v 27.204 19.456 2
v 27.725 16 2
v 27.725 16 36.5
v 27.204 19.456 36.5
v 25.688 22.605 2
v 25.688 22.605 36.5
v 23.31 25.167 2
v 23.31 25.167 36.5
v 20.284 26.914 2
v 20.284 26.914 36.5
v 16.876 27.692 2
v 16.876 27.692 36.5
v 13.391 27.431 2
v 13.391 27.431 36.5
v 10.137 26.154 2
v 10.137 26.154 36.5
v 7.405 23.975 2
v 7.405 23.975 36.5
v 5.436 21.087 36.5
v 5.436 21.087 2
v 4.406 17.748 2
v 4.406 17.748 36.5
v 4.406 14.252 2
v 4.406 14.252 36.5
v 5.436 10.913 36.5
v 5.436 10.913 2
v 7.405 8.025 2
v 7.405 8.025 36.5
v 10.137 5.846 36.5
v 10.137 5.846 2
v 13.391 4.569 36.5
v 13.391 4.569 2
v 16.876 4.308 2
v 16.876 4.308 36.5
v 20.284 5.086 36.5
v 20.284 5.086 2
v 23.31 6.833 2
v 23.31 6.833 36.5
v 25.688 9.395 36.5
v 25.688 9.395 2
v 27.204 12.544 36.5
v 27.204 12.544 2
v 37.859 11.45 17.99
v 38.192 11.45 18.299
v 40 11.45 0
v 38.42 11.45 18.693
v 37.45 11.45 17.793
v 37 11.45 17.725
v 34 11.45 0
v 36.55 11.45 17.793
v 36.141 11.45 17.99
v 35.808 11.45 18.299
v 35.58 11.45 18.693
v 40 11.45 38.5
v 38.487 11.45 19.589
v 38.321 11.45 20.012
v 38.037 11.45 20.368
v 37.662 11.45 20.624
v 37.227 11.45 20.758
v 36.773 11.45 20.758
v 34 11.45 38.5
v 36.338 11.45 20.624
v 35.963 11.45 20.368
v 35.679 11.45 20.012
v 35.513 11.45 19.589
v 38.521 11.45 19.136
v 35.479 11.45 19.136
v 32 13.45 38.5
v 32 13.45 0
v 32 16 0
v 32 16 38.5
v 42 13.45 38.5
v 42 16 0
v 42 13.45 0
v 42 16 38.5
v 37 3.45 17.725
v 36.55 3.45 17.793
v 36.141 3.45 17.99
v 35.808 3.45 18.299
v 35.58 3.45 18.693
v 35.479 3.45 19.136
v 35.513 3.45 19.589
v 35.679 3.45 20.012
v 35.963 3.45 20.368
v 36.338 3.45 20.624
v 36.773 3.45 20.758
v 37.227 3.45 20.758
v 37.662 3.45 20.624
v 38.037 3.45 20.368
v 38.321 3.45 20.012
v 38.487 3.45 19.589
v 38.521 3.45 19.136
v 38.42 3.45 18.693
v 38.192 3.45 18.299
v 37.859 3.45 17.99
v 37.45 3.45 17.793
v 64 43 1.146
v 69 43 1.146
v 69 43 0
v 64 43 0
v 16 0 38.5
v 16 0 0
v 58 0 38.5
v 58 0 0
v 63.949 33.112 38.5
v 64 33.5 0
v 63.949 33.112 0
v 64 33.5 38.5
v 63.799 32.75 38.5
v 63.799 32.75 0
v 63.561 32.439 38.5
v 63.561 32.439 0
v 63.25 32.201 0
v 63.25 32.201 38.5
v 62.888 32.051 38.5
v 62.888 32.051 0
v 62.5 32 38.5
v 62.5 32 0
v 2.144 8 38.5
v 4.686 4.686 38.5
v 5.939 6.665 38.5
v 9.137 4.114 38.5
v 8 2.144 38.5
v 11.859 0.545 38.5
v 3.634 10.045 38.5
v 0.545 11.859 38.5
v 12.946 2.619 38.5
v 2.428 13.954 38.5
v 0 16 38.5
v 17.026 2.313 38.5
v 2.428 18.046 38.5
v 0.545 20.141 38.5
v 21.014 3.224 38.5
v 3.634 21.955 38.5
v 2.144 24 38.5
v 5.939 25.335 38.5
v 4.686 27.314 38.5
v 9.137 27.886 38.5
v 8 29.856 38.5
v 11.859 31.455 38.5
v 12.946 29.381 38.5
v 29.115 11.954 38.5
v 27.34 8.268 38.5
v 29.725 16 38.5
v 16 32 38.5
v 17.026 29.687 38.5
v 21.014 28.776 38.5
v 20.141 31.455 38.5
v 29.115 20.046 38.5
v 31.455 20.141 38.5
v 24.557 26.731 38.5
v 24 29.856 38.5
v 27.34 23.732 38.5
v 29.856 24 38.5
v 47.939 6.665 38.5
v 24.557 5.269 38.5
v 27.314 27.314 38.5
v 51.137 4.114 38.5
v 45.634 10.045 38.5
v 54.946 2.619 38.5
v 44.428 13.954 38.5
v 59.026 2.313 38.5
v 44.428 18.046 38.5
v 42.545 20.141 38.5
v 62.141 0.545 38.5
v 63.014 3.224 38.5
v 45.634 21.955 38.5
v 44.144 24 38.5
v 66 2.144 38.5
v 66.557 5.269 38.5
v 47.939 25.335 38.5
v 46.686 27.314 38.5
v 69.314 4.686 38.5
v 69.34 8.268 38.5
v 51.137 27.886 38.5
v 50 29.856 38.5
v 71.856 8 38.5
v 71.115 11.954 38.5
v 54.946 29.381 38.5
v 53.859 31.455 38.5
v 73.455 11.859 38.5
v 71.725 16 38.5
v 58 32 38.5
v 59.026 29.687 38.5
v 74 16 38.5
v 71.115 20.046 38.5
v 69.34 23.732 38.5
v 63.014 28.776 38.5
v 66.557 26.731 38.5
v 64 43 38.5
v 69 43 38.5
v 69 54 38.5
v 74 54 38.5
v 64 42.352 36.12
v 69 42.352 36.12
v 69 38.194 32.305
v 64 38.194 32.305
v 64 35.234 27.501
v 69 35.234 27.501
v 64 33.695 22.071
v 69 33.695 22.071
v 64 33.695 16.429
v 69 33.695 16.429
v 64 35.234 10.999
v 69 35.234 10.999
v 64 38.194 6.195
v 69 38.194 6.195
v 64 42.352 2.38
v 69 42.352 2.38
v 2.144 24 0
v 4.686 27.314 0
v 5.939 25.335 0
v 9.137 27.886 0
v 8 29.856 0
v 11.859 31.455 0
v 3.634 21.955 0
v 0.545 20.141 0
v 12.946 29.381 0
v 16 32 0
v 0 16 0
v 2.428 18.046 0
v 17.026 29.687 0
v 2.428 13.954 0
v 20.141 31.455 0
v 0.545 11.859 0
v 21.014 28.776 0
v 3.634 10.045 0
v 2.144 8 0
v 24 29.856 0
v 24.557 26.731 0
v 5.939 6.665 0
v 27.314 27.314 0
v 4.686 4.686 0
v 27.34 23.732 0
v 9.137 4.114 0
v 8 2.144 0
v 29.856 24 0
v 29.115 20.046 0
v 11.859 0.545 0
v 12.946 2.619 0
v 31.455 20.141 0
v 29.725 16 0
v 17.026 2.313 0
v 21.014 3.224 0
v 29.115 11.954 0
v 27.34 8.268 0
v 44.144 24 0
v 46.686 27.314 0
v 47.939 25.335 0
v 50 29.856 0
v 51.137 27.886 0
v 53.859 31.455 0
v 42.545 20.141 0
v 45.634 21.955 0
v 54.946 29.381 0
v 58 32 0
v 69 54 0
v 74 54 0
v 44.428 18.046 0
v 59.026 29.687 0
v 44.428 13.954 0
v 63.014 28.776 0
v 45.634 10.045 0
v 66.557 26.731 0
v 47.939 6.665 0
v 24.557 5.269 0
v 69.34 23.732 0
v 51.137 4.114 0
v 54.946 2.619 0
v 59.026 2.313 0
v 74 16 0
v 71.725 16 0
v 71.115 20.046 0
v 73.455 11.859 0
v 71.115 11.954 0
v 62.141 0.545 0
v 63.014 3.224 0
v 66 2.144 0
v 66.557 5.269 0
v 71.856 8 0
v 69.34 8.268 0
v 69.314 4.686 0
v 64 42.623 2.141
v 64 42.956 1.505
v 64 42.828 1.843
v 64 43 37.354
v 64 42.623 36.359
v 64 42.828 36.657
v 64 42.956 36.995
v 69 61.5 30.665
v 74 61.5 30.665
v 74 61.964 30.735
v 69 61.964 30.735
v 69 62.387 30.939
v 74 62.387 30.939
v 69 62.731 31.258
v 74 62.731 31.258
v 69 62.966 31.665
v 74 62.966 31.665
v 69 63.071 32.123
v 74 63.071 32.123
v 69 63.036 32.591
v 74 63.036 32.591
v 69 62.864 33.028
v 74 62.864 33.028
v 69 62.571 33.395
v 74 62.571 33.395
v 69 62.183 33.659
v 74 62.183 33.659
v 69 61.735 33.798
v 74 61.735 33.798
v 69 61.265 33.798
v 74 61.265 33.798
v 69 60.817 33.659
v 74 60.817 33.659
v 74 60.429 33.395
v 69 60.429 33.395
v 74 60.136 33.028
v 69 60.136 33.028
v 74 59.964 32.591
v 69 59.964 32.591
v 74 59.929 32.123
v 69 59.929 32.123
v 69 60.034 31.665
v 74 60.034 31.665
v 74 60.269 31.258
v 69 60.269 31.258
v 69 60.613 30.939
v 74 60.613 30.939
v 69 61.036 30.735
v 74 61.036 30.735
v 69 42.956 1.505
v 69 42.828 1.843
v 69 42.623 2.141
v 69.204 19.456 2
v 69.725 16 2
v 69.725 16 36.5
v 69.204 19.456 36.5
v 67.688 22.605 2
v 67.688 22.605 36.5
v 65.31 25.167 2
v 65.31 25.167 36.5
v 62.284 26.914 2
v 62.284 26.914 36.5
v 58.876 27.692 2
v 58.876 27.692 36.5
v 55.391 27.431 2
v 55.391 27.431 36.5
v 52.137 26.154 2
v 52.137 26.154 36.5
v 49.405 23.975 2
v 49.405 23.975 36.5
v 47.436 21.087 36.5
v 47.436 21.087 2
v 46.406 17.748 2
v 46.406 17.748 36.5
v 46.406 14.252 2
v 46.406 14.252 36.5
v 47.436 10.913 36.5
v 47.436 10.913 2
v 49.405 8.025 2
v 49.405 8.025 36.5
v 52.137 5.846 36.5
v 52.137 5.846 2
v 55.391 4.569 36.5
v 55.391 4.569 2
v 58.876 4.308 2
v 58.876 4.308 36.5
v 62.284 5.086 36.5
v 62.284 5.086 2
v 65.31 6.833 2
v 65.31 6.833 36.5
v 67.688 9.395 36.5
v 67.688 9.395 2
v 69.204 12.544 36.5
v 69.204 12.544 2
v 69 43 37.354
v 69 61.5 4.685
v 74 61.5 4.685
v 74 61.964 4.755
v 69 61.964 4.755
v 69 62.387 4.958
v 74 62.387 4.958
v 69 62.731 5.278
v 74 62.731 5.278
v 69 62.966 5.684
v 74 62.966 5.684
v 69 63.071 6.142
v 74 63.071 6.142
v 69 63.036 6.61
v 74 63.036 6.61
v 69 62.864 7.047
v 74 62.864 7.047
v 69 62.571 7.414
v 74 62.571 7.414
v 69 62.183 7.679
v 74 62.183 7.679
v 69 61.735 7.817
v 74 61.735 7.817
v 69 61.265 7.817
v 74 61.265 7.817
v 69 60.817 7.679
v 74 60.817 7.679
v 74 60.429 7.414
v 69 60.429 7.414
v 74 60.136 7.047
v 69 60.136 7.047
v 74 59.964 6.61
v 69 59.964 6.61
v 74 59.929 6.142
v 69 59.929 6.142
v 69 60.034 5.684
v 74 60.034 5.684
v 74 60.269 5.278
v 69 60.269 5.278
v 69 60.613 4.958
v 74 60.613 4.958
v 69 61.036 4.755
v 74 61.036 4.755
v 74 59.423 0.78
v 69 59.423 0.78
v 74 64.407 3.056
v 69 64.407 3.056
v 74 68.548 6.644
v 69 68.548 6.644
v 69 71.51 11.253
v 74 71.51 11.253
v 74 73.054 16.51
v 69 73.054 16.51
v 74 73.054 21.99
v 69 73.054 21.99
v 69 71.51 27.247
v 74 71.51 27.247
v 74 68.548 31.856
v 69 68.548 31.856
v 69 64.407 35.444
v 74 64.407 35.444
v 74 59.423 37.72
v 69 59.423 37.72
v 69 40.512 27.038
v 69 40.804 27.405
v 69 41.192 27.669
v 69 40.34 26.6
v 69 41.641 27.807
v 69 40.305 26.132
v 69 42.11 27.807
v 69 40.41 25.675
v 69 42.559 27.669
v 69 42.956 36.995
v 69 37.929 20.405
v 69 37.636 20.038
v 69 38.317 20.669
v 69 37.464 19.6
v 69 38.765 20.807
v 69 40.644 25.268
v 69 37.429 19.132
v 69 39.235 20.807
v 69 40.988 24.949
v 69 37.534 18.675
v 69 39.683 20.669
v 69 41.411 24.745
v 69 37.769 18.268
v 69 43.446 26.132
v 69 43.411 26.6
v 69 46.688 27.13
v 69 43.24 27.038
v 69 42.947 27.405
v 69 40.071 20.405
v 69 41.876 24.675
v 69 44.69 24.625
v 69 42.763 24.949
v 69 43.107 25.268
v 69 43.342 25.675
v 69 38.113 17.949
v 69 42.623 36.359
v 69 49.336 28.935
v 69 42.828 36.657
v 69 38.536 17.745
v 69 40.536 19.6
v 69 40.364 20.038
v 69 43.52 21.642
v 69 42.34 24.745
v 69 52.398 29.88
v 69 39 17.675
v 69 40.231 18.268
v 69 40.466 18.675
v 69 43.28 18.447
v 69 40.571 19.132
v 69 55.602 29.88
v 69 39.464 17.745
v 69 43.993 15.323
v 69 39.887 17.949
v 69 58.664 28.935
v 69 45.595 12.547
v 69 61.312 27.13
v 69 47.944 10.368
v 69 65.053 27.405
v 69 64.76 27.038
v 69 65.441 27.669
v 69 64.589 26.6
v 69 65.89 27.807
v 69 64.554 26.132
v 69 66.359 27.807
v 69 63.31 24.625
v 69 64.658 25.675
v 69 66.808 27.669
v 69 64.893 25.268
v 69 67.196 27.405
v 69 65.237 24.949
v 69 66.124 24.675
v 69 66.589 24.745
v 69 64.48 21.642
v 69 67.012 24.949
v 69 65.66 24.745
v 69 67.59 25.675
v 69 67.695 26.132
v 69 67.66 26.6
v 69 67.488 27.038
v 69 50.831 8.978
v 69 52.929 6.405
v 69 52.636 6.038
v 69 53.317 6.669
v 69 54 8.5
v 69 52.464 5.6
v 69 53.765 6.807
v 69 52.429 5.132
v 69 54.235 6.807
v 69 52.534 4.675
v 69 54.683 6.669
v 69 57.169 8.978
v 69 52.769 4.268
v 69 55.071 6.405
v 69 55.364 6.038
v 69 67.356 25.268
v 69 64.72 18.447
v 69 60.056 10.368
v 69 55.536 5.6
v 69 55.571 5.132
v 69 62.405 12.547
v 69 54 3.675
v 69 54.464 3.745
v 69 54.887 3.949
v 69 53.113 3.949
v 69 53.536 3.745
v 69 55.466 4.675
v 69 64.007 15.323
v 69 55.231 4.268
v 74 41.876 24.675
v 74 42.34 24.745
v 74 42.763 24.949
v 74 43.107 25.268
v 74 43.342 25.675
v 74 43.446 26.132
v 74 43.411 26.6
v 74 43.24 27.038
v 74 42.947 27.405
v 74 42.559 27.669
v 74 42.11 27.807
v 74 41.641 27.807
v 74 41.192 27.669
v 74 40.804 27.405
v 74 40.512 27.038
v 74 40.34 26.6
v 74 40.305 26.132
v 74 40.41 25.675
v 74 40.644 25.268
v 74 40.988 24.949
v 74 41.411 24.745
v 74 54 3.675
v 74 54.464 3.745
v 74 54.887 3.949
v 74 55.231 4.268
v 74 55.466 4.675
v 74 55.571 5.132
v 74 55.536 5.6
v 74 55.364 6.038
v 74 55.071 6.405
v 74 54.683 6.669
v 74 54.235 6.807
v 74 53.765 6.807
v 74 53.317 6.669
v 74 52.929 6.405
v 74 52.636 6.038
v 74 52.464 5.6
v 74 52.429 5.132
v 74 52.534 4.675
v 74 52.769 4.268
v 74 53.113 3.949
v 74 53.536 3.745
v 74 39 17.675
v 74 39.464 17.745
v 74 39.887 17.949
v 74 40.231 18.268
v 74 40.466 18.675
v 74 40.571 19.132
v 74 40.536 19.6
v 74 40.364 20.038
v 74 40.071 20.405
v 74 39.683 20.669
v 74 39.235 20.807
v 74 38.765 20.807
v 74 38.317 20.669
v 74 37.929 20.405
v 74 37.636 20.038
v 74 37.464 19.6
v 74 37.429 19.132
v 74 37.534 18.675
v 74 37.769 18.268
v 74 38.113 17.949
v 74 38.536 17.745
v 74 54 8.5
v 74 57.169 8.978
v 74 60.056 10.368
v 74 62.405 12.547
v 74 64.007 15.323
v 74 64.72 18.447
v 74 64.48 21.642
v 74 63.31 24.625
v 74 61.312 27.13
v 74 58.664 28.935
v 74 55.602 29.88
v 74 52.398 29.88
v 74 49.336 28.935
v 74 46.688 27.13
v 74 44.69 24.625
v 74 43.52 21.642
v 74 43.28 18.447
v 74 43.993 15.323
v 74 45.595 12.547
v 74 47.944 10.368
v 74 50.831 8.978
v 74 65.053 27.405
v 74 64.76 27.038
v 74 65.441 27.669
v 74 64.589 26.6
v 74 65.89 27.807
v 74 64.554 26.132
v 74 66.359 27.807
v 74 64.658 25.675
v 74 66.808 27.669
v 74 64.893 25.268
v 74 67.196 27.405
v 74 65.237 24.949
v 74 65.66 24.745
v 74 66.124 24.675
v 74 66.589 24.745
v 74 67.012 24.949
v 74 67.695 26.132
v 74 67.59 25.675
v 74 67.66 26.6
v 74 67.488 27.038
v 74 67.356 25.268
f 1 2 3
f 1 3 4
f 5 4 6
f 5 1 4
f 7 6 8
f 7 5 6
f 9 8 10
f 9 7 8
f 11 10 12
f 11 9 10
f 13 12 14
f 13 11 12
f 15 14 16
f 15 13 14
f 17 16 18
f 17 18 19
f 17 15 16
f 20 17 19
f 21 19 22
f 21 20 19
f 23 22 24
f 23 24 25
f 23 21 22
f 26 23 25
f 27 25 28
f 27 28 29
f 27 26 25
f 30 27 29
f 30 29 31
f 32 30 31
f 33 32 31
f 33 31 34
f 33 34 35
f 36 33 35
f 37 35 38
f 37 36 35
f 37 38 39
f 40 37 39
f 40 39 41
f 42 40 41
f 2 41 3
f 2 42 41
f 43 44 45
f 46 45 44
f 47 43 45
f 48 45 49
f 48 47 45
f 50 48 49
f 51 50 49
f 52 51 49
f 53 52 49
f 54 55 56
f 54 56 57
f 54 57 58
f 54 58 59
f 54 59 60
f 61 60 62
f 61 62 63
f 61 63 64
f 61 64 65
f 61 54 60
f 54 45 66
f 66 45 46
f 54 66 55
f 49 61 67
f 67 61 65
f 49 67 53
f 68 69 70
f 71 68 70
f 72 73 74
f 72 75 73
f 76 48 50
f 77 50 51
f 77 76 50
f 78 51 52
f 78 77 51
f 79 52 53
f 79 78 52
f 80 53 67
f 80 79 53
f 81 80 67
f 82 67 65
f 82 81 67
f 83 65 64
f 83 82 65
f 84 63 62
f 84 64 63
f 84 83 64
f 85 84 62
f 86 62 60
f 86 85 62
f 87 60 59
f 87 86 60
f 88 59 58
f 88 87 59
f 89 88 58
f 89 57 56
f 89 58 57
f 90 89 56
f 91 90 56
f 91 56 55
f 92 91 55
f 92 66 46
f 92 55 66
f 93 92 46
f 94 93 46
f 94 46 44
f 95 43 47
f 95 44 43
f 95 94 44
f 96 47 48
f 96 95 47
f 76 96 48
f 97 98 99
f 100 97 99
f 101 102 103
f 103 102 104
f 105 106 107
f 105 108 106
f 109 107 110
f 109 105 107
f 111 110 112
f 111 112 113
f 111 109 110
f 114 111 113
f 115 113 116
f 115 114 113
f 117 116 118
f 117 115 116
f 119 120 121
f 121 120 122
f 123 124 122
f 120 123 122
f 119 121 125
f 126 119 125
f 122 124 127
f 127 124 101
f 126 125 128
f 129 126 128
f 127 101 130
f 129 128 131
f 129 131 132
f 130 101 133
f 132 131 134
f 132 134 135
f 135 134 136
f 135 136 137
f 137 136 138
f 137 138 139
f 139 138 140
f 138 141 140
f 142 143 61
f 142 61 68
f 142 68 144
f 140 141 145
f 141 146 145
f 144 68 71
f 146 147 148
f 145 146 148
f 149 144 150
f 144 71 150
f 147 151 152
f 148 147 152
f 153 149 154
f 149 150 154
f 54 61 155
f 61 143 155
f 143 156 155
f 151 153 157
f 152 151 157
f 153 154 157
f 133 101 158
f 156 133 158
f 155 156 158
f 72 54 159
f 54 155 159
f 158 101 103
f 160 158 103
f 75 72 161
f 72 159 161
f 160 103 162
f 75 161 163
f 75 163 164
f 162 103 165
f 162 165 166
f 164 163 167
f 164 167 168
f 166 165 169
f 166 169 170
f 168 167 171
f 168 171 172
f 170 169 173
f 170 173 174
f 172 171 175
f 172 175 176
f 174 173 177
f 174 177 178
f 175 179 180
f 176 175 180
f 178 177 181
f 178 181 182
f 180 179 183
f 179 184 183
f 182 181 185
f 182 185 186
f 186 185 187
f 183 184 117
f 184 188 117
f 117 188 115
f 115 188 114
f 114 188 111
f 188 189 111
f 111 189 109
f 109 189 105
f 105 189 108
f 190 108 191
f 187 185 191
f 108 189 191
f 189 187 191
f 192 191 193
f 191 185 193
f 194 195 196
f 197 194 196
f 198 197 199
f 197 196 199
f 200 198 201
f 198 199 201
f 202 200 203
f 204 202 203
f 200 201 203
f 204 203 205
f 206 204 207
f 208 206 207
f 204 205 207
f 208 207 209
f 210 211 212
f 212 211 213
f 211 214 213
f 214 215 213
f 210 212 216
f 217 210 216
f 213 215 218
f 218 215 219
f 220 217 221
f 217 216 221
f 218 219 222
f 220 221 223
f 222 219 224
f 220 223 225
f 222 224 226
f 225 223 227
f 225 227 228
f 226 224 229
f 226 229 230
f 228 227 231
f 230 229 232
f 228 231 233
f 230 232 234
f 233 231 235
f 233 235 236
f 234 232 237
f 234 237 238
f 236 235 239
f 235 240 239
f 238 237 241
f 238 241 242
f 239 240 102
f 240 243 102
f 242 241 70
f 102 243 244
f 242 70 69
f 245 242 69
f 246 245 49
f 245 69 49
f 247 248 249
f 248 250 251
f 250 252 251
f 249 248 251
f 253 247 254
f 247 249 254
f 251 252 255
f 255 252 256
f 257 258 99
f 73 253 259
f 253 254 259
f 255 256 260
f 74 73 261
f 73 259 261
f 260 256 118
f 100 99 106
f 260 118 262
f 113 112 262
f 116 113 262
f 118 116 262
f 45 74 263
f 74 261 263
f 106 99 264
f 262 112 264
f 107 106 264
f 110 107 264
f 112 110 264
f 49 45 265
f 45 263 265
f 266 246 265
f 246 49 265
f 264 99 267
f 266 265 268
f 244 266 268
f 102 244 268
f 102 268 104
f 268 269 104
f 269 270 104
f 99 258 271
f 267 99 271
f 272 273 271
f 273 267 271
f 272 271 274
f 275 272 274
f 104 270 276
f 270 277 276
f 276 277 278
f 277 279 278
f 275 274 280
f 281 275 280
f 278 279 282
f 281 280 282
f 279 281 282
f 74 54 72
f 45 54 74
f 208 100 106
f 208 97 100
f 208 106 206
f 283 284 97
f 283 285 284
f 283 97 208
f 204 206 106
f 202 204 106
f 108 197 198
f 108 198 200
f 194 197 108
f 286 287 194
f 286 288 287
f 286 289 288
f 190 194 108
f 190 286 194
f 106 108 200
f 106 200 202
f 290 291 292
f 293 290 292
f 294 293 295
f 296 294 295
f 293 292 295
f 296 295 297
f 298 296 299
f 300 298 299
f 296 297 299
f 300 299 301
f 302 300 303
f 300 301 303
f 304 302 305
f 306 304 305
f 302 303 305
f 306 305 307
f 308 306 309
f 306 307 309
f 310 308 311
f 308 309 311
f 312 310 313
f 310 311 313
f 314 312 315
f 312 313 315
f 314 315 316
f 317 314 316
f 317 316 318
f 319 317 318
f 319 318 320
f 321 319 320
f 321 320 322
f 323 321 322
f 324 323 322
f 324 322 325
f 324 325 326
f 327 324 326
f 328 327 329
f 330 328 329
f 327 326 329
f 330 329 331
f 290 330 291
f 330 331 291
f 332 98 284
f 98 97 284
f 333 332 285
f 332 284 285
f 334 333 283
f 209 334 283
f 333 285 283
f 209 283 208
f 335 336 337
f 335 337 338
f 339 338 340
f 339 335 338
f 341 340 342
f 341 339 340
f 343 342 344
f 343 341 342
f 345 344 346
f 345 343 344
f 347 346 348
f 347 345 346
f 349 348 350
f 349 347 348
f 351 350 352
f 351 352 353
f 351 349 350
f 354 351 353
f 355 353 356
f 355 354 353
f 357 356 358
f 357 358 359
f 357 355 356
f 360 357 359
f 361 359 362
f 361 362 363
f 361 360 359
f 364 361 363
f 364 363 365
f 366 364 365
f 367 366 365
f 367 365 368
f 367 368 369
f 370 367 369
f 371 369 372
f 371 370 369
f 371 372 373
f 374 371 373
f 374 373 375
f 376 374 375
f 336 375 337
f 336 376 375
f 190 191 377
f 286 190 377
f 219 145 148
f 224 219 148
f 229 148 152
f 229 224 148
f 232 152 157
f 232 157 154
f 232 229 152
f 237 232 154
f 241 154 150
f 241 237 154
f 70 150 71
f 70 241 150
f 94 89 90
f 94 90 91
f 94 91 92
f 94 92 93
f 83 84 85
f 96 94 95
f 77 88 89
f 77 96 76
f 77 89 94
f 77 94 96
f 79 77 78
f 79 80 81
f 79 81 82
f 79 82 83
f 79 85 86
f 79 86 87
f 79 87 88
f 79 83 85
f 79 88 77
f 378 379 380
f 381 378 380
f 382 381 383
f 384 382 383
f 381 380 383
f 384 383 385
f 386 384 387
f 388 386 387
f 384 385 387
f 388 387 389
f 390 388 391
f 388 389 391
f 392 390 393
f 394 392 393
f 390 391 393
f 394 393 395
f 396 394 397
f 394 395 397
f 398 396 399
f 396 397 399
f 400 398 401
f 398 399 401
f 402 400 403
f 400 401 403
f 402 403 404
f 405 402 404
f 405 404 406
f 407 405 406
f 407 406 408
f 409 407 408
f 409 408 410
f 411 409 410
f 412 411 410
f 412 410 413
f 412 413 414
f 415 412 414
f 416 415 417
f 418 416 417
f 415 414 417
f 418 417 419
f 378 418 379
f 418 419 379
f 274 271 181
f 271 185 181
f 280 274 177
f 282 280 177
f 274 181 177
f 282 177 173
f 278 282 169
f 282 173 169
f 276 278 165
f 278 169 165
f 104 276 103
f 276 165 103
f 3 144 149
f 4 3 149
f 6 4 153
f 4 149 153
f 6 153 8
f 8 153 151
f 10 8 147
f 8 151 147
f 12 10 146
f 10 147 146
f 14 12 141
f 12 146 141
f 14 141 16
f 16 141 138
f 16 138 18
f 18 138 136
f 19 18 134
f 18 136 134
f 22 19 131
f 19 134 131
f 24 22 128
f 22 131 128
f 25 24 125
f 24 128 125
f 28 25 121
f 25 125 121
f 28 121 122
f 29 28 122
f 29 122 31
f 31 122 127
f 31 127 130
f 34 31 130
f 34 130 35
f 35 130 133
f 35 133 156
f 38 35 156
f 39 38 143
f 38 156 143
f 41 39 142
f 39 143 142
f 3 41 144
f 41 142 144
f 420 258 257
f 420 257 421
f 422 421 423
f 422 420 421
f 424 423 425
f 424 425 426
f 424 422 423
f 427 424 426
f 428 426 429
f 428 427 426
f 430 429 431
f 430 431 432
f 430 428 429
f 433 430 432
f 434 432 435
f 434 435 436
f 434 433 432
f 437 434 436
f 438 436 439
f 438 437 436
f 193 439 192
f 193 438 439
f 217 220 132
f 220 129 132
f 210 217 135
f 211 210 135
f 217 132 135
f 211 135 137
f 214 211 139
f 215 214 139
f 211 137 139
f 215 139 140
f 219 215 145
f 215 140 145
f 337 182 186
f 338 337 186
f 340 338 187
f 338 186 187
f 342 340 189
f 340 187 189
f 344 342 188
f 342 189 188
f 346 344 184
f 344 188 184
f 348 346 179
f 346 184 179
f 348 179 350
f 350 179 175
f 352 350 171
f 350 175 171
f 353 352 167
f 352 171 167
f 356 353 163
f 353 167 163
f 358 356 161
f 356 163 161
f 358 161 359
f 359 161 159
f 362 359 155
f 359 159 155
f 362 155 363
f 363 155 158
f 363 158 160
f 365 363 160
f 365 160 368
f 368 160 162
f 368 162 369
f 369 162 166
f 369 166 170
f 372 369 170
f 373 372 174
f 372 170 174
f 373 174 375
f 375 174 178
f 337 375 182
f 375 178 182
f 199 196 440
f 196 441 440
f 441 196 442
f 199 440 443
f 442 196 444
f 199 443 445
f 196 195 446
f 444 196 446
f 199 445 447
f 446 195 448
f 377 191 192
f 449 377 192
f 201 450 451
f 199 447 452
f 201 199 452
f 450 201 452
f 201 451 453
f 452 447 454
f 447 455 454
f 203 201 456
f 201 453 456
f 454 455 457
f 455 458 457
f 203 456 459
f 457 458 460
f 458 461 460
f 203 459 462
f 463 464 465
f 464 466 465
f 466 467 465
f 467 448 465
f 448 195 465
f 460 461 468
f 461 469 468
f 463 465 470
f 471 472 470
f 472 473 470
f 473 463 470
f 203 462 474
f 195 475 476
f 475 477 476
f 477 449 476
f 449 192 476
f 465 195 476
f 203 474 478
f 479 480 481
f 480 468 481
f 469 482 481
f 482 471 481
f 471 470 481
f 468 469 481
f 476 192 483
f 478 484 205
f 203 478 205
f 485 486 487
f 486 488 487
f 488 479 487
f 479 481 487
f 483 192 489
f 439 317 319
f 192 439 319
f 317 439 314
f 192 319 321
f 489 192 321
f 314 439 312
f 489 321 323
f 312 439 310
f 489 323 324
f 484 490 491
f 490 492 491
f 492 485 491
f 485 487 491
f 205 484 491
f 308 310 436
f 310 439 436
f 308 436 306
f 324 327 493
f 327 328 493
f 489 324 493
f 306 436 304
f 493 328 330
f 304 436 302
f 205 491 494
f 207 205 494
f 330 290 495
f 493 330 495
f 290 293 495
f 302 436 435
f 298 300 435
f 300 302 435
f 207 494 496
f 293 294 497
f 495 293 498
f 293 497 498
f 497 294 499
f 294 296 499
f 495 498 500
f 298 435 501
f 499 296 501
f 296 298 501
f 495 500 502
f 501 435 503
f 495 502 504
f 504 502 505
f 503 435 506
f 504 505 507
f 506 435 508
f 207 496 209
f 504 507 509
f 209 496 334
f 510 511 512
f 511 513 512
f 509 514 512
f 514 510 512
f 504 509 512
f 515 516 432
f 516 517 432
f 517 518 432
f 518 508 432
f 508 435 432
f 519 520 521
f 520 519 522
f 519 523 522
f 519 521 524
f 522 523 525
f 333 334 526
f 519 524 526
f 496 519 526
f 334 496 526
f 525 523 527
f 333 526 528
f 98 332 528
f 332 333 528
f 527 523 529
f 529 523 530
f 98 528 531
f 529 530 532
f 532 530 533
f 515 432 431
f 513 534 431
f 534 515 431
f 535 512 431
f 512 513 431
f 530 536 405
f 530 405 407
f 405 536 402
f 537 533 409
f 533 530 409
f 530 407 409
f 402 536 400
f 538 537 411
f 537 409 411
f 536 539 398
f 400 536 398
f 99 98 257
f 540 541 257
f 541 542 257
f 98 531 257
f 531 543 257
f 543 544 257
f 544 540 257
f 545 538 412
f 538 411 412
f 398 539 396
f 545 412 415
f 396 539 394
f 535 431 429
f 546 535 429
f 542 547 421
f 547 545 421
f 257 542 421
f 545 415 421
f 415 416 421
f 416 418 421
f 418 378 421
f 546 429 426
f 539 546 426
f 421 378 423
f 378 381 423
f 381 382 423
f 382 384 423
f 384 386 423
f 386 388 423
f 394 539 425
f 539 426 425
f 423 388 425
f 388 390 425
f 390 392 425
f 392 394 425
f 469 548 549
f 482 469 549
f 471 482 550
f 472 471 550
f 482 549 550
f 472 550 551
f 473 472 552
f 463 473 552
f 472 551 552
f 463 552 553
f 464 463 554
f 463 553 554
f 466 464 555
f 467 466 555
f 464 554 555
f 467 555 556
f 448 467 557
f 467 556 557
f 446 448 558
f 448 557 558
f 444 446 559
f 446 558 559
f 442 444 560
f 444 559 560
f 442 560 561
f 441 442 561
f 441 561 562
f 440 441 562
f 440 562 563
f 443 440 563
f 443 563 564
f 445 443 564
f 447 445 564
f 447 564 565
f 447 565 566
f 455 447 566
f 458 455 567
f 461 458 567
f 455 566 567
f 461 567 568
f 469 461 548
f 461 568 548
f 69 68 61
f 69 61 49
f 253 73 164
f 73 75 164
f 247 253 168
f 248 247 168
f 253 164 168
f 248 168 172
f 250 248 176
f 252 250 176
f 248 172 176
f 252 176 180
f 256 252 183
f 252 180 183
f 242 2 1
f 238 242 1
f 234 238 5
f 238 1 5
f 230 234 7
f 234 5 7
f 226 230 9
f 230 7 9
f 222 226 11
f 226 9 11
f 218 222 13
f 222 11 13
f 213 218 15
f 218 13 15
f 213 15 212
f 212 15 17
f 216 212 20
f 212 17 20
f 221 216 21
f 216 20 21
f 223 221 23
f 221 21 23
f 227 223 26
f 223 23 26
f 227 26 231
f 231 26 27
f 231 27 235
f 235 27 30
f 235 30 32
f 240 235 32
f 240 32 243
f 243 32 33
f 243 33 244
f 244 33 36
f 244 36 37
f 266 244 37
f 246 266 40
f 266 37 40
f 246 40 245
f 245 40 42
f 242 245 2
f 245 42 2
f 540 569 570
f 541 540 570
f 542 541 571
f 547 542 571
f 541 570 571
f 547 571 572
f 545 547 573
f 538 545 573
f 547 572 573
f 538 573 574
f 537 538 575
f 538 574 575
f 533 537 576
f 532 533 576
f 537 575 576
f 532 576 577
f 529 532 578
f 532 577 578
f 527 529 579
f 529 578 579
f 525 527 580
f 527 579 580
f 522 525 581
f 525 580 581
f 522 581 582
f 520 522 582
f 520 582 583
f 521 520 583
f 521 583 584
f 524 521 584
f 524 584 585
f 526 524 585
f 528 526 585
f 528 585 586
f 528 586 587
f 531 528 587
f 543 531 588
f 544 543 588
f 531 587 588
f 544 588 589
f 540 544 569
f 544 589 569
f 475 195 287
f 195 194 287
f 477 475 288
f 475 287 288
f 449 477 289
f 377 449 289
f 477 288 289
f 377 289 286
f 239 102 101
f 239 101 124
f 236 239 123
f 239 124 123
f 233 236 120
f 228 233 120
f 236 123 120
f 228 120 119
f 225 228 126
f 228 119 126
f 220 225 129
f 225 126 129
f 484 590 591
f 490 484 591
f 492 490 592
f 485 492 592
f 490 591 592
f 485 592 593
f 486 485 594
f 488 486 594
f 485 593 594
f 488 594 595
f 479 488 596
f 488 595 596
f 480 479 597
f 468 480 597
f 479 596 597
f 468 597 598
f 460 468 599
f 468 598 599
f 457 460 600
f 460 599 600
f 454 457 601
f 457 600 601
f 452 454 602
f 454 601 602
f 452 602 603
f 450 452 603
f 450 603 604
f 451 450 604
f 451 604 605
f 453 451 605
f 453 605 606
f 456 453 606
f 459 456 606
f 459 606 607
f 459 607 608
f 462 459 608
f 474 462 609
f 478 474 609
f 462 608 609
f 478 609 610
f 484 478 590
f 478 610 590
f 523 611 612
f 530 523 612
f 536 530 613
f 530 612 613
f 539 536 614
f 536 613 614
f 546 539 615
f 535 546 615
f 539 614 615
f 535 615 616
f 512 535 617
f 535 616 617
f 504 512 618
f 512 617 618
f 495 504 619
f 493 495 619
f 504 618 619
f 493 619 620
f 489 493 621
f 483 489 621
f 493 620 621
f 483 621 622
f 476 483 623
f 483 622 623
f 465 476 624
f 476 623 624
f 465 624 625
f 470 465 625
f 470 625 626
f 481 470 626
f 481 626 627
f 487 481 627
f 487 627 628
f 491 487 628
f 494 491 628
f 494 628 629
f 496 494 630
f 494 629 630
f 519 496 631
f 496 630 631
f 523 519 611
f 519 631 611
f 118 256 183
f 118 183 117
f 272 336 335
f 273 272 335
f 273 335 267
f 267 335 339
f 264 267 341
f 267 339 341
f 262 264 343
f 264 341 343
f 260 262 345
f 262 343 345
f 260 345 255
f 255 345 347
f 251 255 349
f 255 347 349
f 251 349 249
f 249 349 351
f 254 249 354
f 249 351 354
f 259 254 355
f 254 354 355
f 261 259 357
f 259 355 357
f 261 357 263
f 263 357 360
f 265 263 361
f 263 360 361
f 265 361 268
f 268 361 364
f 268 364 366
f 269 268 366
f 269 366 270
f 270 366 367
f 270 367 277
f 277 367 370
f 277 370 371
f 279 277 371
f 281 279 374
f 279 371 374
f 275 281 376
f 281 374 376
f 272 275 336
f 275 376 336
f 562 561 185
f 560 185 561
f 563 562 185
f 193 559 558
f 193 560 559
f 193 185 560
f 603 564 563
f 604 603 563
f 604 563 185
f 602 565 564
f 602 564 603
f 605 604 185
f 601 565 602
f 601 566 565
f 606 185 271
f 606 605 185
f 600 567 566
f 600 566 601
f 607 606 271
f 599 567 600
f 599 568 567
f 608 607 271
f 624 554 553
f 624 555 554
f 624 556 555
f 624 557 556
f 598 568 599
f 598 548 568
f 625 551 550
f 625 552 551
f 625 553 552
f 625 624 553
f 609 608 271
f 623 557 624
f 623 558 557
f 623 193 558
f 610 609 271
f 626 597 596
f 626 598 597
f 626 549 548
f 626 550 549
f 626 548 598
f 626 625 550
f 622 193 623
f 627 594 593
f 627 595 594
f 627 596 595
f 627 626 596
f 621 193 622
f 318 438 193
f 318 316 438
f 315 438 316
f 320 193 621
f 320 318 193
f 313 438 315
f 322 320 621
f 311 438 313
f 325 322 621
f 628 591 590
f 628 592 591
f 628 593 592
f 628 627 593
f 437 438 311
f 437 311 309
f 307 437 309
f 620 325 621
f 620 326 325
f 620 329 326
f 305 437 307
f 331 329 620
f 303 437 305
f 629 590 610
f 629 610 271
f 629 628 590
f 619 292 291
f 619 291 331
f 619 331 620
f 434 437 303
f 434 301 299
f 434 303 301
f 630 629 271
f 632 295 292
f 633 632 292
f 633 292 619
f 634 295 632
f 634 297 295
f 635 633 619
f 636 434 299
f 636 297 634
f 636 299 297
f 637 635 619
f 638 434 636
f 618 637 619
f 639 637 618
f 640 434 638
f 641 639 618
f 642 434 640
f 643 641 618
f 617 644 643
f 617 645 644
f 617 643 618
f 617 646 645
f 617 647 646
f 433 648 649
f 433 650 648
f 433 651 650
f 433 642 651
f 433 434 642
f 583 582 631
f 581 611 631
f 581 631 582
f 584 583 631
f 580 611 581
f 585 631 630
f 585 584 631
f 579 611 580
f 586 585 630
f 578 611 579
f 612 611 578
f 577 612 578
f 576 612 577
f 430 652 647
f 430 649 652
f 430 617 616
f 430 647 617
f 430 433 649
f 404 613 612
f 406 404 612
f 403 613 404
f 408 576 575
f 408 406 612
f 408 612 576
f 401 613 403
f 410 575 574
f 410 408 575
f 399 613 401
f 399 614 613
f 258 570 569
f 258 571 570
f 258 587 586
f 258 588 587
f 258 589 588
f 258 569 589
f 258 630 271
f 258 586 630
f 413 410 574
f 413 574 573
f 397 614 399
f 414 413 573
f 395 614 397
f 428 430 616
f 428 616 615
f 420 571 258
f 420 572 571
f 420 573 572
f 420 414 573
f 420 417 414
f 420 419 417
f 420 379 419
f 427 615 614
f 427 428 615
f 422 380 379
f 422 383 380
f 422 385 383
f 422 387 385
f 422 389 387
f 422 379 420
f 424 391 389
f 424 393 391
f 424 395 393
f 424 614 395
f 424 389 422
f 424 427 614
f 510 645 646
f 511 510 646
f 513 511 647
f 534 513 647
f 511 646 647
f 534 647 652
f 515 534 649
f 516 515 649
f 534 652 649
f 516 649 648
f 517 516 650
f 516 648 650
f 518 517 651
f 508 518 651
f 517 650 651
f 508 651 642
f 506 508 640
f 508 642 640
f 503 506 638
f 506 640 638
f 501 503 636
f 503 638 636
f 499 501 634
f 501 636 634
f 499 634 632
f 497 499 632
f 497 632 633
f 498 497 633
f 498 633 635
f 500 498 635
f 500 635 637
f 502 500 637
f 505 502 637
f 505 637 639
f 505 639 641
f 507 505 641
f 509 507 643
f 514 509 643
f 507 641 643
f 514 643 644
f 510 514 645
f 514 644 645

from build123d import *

# Parameters (mm, degrees)
SKETCH1_W               = 74
SKETCH1_H               = 32
SKETCH1_R               = 11.725
BOSS_EXTRUDE1_DEPTH     = 38.5
SKETCH2_R               = 1.575
SKETCH2_R_2             = 10.75
BOSS_EXTRUDE2_DEPTH     = 5
BOSS_EXTRUDE3_DEPTH     = 5
CUT_EXTRUDE1_DEPTH      = 112.012668196
CUT_EXTRUDE1_DEPTH_BACK = 112.012668196
SKETCH4_W               = 10
SKETCH4_H               = 25
SKETCH4_H_2             = 4.450035805
CUT_EXTRUDE2_DEPTH      = 104.814669361
CUT_EXTRUDE2_DEPTH_BACK = 8
SKETCH5_R               = 1.525
FILLET8_R               = 16
FILLET9_R               = 1.5
FILLET10_SIZE           = 2


with BuildPart() as part:
    # Sketch1 → Boss-Extrude1 (new body)
    with BuildSketch(Plane.XY):
        with Locations((37, 16)):
            Rectangle(SKETCH1_W, SKETCH1_H)
        with Locations((16, 16)):
            Circle(SKETCH1_R, mode=Mode.SUBTRACT)
        with Locations((58, 16)):
            Circle(SKETCH1_R, mode=Mode.SUBTRACT)
    extrude(amount=BOSS_EXTRUDE1_DEPTH)

    # Sketch2 → Boss-Extrude2 (add)
    with BuildSketch(Plane(origin=(74, 0, 0), x_dir=(0, 0, -1), z_dir=(1, 0, 0))):
        with BuildLine():
            Line((-38.5, 32), (0, 32))
            Line((0, 32), (0, 54))
            ThreePointArc((0, 54), (-19.25, 73.25), (-38.5, 54))
            Line((-38.5, 54), (-38.5, 32))
        make_face()
        with Locations((-6.259618943, 61.5)):
            Circle(SKETCH2_R, mode=Mode.SUBTRACT)
        with Locations((-26.25, 41.875644347)):
            Circle(SKETCH2_R, mode=Mode.SUBTRACT)
        with Locations((-32.240381057, 61.5)):
            Circle(SKETCH2_R, mode=Mode.SUBTRACT)
        with Locations((-26.25, 66.124355653)):
            Circle(SKETCH2_R, mode=Mode.SUBTRACT)
        with Locations((-19.25, 39)):
            Circle(SKETCH2_R, mode=Mode.SUBTRACT)
        with Locations((-19.25, 54)):
            Circle(SKETCH2_R_2, mode=Mode.SUBTRACT)
        with Locations((-5.25, 54)):
            Circle(SKETCH2_R, mode=Mode.SUBTRACT)
    extrude(amount=-BOSS_EXTRUDE2_DEPTH)

    # Sketch3 → Boss-Extrude3 (add)
    with BuildSketch(Plane.ZY.offset(-69)):
        with BuildLine():
            Line((0, 43), (0, 32))
            Line((0, 32), (38.5, 32))
            Line((38.5, 32), (38.5, 43))
            Line((38.5, 43), (36.548843892, 43))
            ThreePointArc((36.548843892, 43), (19.25, 33.5), (1.951156108, 43))
            Line((1.951156108, 43), (0, 43))
        make_face()
    extrude(amount=BOSS_EXTRUDE3_DEPTH)

    # Sketch4 → Cut-Extrude1 (cut, two sides: drawn at the far end of the back side and taken through both)
    with BuildSketch(Plane(origin=(0, 0, 0), x_dir=(-1, 0, 0), z_dir=(0, 0, -1)).offset(-CUT_EXTRUDE1_DEPTH_BACK)):
        with Locations((-37, 23.950035805)):
            Rectangle(SKETCH4_W, SKETCH4_H)
        with Locations((-37, 34.225017902)):
            Rectangle(SKETCH4_W, SKETCH4_H_2)
    extrude(amount=CUT_EXTRUDE1_DEPTH + CUT_EXTRUDE1_DEPTH_BACK, mode=Mode.SUBTRACT)

    # Sketch5 → Cut-Extrude2 (cut, two sides: drawn at the far end of the back side and taken through both)
    with BuildSketch(Plane(origin=(0, 11.450035805, 0), x_dir=(1, 0, 0), z_dir=(0, 1, 0)).offset(-CUT_EXTRUDE2_DEPTH_BACK)):
        with Locations(Location((37, -19.25, 0), (0, 0, 90))):
            Circle(SKETCH5_R)
    extrude(amount=CUT_EXTRUDE2_DEPTH + CUT_EXTRUDE2_DEPTH_BACK, mode=Mode.SUBTRACT)

    # Fillet8
    fillet8_edges = [part.edges().sort_by_distance(p)[0] for p in [
        (42, 32, 19.25),
        (32, 32, 19.25),
        (0, 32, 19.25),
        (0, 0, 19.25),
        (74, 0, 19.25),
    ]]
    fillet(fillet8_edges, radius=FILLET8_R - 0.0001)  # a hair under: the kernel refuses the full size

    # Fillet9
    fillet9_edges = [part.edges().sort_by_distance(p)[0] for p in [
        (66.5, 43, 36.548843892),
        (66.5, 43, 1.951156108),
        (64, 32, 19.25),
    ]]
    fillet(fillet9_edges, radius=FILLET9_R - 0.0001)  # a hair under: the kernel refuses the full size

    # Fillet10
    fillet10_edges = [part.edges().sort_by_distance(p)[0] for p in [
        (4.275, 16, 0),
        (4.275, 16, 38.5),
        (46.275, 16, 0),
        (46.275, 16, 38.5),
        (42, 11.450035805, 19.25),
        (32, 11.450035805, 19.25),
    ]]
    chamfer(fillet10_edges, length=FILLET10_SIZE)


solid = part.part
